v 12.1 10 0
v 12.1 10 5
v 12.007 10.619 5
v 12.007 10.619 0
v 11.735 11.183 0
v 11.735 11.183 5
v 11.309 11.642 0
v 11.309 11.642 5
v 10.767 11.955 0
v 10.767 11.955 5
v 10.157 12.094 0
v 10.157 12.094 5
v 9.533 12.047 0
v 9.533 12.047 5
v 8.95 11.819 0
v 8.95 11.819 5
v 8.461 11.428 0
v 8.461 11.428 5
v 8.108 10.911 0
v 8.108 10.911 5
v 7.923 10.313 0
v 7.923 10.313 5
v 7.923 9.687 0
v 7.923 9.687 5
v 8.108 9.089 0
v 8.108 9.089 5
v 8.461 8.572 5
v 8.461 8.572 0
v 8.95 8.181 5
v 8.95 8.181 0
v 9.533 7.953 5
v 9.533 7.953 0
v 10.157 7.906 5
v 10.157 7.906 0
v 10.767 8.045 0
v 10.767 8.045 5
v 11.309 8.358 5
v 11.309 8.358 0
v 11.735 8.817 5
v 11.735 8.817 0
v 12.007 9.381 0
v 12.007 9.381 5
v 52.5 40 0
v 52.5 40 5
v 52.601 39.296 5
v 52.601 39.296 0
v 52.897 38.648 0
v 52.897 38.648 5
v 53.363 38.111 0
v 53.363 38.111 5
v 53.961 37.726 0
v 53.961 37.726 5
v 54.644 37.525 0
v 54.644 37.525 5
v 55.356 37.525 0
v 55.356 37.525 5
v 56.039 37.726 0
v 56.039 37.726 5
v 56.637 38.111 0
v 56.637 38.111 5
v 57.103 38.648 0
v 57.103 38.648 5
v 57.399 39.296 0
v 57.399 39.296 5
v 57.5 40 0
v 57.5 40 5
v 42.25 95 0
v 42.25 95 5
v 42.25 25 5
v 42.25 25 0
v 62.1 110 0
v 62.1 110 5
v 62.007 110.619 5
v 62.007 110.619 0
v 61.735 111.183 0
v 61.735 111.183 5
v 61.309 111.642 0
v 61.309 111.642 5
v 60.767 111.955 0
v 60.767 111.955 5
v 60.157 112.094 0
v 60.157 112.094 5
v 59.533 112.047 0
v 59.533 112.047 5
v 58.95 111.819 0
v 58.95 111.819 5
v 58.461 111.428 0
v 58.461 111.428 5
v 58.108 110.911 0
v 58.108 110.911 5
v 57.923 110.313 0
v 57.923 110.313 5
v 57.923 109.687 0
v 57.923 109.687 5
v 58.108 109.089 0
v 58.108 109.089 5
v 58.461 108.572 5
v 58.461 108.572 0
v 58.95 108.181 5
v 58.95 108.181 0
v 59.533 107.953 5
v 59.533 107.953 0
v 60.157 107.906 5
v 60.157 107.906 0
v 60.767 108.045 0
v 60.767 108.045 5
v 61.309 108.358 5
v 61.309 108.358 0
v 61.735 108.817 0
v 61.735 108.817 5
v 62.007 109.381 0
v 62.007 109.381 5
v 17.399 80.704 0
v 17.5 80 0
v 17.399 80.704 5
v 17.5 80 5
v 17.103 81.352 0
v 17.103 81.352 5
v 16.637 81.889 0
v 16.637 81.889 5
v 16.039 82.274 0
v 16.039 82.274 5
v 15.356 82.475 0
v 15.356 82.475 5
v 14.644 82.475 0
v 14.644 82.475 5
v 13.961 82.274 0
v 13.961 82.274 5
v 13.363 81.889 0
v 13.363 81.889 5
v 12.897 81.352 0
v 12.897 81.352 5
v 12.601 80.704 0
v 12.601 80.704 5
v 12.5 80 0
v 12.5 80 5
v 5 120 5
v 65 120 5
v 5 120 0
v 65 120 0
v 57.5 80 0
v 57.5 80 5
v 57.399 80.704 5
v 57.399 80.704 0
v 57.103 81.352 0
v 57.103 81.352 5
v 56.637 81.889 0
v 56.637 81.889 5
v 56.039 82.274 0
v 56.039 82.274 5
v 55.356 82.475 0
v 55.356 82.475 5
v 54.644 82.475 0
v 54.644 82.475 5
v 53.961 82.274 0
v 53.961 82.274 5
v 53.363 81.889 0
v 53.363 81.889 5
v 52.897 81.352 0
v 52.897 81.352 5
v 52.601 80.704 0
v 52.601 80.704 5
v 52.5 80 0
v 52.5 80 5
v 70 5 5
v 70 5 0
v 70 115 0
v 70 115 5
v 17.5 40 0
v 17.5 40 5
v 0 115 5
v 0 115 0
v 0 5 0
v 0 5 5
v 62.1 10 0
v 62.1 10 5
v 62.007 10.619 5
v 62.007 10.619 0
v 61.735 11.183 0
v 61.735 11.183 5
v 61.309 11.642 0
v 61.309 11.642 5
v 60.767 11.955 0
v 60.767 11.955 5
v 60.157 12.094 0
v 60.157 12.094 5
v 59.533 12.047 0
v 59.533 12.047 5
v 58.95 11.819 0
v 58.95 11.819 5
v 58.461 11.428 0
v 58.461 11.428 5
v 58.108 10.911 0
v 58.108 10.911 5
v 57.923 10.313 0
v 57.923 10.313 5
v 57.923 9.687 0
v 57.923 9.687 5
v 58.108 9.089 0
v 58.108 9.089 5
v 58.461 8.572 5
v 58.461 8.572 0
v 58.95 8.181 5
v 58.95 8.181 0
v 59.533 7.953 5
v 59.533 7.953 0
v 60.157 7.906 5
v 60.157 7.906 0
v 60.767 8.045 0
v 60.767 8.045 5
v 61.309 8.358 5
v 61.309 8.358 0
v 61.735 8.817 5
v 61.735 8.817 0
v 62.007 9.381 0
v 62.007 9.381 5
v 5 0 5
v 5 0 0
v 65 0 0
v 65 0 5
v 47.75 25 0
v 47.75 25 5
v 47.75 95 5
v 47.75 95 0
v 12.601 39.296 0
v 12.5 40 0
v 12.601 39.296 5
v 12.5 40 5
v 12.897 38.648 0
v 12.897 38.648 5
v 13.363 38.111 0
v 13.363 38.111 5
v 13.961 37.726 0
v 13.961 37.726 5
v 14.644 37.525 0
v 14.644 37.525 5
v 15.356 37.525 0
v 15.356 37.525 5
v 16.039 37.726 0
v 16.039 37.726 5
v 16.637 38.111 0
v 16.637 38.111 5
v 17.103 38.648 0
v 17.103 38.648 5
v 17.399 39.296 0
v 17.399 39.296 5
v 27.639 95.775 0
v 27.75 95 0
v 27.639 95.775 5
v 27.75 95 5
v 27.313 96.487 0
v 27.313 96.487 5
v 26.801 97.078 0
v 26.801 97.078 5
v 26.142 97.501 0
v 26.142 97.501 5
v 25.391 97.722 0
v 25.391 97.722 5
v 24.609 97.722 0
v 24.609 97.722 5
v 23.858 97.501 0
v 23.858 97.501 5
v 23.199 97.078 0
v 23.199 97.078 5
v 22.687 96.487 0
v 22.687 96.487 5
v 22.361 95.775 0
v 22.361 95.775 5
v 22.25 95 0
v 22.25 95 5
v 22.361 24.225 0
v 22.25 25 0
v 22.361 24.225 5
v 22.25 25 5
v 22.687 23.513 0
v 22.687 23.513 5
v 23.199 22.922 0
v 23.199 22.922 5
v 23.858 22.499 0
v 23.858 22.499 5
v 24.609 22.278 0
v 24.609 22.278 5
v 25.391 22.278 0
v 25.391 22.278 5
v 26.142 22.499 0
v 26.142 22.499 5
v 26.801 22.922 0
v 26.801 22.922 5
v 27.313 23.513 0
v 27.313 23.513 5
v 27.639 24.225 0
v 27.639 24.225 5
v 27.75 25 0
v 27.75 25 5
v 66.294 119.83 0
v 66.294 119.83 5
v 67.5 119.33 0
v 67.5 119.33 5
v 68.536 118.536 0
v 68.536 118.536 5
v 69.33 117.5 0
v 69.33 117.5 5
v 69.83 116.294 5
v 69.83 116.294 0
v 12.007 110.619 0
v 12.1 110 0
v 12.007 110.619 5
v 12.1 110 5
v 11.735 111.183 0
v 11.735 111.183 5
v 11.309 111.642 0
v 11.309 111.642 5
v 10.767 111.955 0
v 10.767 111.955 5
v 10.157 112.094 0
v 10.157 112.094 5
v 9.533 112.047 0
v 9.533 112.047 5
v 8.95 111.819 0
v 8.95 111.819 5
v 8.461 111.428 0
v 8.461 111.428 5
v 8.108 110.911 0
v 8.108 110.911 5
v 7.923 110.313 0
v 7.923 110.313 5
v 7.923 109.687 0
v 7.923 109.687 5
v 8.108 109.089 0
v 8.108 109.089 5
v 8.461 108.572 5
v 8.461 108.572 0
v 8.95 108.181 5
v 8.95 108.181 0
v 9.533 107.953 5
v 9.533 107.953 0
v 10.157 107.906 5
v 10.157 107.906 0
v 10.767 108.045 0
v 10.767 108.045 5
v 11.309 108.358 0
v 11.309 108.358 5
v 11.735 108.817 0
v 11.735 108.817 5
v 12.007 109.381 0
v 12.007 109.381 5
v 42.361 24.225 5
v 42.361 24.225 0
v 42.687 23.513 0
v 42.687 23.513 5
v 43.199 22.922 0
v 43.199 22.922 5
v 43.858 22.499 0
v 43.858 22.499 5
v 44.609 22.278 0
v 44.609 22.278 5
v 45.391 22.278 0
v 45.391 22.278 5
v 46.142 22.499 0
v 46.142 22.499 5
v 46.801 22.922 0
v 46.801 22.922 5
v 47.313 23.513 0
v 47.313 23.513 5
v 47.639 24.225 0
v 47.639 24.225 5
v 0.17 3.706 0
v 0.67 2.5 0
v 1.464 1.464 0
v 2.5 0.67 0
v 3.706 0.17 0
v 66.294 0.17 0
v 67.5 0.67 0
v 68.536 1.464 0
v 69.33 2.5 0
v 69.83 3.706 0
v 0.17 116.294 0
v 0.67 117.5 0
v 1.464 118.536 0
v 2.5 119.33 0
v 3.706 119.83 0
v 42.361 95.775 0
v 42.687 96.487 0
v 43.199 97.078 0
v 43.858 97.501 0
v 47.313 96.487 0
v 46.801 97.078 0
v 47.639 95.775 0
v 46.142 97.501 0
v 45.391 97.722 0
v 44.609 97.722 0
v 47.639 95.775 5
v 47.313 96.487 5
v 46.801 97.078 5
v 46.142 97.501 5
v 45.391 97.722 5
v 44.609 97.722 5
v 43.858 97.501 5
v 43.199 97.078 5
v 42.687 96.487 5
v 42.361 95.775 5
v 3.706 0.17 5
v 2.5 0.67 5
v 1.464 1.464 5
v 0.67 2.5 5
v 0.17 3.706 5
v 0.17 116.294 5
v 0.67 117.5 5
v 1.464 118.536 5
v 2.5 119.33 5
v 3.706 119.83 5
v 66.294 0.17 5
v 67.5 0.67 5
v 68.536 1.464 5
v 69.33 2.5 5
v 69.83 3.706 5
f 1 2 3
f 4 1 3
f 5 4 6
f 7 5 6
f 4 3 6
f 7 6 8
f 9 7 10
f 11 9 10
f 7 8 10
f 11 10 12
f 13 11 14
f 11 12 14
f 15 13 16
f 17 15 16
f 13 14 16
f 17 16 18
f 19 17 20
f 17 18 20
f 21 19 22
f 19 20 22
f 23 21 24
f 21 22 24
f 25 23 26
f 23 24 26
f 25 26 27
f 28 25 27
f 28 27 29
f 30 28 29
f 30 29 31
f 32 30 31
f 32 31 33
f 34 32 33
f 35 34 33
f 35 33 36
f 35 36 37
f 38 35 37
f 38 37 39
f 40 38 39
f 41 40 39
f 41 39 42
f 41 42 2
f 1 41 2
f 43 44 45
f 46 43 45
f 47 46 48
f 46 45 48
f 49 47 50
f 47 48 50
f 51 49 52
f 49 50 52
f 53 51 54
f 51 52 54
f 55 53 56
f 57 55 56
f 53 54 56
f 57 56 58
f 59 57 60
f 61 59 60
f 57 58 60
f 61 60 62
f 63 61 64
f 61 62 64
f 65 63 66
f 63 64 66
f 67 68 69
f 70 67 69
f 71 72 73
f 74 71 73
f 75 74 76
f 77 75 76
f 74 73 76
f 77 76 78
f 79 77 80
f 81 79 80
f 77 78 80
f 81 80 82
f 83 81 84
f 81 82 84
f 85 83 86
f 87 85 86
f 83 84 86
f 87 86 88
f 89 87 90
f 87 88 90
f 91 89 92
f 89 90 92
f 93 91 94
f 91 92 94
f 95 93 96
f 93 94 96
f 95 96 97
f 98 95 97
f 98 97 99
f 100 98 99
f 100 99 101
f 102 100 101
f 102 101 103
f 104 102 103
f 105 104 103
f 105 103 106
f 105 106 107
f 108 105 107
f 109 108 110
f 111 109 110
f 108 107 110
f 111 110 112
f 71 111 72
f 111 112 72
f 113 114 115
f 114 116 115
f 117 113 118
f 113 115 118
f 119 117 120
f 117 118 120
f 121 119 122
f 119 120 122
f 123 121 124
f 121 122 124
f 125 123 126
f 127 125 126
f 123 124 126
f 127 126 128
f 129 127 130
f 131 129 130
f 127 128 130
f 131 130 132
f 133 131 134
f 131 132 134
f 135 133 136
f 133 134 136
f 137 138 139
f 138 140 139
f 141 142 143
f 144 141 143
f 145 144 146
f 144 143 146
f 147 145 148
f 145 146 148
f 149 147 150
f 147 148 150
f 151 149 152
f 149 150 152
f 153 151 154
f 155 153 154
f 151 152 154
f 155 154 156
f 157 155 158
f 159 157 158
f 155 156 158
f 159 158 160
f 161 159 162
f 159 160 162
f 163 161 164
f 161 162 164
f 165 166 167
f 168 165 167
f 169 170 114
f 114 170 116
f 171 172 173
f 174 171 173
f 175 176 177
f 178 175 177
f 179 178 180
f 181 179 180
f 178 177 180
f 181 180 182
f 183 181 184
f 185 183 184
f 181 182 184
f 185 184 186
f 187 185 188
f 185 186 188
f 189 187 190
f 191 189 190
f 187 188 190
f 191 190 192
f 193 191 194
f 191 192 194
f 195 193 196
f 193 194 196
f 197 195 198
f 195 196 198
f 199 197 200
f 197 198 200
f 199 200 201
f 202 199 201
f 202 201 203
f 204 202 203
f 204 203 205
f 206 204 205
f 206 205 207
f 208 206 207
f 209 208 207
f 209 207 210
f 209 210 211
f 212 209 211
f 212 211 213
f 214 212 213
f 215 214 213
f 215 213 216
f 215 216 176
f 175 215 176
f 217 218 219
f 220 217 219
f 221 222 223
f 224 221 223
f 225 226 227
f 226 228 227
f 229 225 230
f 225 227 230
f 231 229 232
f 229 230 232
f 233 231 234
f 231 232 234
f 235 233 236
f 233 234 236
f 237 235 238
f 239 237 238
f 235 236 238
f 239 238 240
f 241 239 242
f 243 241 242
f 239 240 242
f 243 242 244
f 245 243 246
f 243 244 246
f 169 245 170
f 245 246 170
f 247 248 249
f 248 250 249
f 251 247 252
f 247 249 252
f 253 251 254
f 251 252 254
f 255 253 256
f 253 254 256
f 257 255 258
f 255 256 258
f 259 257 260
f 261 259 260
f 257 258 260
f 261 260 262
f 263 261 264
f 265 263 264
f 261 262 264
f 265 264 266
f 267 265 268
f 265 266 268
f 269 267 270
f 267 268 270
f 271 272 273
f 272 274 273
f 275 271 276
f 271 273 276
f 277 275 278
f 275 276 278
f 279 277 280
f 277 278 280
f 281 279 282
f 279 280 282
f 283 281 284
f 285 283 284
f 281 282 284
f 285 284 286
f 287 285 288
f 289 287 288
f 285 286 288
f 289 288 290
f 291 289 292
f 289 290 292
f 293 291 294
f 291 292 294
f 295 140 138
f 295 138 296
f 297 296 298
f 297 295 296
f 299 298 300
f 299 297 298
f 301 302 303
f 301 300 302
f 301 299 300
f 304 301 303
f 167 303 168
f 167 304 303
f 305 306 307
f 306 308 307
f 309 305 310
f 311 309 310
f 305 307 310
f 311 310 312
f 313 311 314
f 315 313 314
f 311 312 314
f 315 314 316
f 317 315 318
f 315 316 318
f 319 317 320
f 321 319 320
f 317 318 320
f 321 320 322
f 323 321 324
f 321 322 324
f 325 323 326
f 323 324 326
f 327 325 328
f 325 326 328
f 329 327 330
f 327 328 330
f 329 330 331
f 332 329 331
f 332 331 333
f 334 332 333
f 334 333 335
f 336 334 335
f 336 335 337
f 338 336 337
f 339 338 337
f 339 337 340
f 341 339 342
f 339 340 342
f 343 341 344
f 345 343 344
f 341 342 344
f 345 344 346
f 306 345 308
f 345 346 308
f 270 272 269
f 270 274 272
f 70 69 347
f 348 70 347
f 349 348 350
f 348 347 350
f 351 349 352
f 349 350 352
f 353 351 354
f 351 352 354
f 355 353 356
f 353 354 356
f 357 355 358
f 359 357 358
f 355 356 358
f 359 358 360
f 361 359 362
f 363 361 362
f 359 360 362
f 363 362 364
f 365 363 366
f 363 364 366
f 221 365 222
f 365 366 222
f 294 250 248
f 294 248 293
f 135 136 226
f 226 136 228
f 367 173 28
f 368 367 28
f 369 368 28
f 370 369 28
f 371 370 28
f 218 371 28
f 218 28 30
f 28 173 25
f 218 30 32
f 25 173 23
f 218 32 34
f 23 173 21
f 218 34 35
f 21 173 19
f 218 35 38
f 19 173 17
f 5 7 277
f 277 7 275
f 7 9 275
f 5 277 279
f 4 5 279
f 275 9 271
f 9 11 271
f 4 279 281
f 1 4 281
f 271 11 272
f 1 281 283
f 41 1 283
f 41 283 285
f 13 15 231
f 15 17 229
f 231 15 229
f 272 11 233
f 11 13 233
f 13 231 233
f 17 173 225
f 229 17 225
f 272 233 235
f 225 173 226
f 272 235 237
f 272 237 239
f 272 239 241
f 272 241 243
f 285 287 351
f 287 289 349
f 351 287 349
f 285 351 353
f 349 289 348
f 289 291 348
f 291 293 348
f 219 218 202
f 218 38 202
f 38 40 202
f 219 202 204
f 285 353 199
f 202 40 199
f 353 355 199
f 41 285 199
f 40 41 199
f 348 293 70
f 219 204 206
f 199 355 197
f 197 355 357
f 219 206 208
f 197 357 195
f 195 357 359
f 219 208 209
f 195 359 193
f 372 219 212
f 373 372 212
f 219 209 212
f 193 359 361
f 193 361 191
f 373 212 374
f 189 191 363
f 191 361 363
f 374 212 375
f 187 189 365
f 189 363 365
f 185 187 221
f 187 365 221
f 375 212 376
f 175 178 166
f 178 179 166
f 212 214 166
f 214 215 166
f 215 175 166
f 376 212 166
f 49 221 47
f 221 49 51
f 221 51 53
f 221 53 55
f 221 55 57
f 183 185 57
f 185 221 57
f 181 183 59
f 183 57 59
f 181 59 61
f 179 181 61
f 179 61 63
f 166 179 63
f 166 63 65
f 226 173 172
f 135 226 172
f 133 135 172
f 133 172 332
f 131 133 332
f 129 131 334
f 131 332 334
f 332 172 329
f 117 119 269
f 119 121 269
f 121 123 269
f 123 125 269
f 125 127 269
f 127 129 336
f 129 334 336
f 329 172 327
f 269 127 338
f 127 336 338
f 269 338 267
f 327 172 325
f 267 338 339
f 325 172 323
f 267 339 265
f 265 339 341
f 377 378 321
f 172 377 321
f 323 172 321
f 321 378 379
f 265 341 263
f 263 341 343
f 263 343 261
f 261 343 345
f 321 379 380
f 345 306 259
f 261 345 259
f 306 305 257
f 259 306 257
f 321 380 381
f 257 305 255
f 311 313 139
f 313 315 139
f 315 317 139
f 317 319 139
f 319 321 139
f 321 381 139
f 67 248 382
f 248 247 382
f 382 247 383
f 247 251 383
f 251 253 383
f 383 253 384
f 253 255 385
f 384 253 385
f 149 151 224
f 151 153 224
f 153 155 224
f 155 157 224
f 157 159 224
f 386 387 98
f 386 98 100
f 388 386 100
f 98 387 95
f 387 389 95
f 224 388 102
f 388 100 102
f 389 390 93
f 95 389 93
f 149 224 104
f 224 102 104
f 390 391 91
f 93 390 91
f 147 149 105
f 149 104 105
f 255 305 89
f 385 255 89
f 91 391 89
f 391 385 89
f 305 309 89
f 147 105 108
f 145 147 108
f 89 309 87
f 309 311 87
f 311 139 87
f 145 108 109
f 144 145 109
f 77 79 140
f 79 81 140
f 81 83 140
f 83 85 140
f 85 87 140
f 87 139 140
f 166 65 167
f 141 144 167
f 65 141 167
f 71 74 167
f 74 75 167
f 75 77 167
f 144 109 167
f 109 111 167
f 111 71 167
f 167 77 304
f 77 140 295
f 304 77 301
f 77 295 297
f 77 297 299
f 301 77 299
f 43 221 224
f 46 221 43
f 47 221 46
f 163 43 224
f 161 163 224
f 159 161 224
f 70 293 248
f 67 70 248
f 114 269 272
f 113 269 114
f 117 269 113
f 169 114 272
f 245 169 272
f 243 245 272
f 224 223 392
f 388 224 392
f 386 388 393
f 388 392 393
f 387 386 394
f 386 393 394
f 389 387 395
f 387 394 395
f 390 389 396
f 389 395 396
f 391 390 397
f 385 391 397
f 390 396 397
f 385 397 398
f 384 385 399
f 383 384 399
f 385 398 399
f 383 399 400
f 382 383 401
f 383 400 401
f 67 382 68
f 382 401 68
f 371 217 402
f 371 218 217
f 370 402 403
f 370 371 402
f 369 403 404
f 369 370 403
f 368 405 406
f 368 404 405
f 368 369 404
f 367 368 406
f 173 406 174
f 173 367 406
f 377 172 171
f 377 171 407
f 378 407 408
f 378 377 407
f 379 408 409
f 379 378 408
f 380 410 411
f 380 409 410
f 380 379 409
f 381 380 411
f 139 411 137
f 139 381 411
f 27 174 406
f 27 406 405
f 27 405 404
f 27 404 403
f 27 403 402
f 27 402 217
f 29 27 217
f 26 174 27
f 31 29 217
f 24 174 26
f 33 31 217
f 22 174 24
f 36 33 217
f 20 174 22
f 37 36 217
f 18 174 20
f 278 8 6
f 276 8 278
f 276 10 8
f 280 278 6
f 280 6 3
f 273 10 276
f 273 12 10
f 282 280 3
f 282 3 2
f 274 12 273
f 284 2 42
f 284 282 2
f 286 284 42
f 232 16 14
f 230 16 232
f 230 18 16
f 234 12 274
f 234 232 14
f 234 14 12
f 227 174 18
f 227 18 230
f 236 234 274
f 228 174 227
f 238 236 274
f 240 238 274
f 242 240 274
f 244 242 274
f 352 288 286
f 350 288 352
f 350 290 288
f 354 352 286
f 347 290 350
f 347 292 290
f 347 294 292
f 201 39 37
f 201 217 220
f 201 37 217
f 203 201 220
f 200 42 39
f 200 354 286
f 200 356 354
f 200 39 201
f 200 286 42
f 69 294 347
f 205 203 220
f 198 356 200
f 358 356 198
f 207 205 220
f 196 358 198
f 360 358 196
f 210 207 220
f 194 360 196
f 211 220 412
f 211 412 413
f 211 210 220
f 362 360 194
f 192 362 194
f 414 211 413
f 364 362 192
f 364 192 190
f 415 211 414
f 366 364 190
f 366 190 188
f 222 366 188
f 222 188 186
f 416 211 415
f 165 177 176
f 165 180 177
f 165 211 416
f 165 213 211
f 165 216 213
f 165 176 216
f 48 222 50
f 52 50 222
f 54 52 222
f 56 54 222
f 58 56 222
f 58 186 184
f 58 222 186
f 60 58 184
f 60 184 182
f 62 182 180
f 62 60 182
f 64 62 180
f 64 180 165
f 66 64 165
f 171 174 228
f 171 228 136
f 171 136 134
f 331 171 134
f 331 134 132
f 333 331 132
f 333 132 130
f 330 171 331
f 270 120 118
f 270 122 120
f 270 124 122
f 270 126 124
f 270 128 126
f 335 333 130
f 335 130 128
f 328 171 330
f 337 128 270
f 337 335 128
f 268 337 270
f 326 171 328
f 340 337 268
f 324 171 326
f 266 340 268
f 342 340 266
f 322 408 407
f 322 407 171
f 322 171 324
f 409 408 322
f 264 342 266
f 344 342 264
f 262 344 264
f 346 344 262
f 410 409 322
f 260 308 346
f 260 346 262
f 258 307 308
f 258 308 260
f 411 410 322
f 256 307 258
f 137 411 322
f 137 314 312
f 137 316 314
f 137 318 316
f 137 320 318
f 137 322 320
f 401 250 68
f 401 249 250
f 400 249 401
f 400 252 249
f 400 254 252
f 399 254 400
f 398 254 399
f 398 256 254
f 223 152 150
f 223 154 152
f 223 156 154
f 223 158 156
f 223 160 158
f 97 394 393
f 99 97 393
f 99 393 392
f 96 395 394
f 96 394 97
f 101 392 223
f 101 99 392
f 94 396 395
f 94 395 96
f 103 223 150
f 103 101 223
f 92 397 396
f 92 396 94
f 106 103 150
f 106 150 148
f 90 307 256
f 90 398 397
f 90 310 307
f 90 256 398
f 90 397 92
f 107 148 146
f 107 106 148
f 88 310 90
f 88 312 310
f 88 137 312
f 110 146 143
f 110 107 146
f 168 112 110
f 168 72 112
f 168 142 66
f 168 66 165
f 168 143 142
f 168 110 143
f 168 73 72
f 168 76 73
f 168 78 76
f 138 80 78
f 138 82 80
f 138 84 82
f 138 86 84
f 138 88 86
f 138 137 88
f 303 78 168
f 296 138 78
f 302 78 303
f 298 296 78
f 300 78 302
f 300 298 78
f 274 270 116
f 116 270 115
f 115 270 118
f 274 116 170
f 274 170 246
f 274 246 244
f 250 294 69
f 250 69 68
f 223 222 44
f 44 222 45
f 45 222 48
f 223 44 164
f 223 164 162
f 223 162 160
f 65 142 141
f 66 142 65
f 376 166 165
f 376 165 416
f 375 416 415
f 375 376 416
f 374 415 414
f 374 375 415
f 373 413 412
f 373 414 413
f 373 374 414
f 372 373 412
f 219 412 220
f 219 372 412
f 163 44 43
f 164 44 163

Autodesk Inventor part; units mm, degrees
ref_plane "YZ Plane" through (0, 0, 0) normal (1, 0, 0) x (0, 1, 0)
ref_plane "XZ Plane" through (0, 0, 0) normal (0, 1, 0) x (-1, 0, 0)
ref_plane "XY Plane" through (0, 0, 0) normal (0, 0, 1) x (1, 0, 0)
sketch "Skizze1" plane through (0, 0, 0) normal (0, 0, 1) x (1, 0, 0)
  line L0 (5, 0) -> (65, 0)
  line L1 (70, 5) -> (70, 115)
  line L2 (65, 120) -> (5, 120)
  line L3 (0, 115) -> (0, 5)
  arc A0 (70, 115) -> (65, 120) centre (65, 115) ccw
  arc A1 (65, 0) -> (70, 5) centre (65, 5) ccw
  arc A2 (0, 5) -> (5, 0) centre (5, 5) ccw
  arc A3 (5, 120) -> (0, 115) centre (5, 115) ccw
  point P0 (0, 0)
  point P1 (70, 120)
  point P2 (70, 0)
  dimension "d0" = 120
  dimension "d1" = 70
  dimension "d3" = 5
extrude "Extrusion1" add sketch "Skizze1" along normal blind 5
sketch "Skizze2" plane through (0, 0, 5) normal (0, 0, 1) x (1, 0, 0)
  circle A0 centre (60, 10) radius 2.1
  circle A1 centre (10, 10) radius 2.1
  circle A2 centre (10, 110) radius 2.1
  circle A3 centre (60, 110) radius 2.1
  point P0 (0, 0)
  dimension "d6" = 4.2
  dimension "d7" = 4.2
  dimension "d8" = 4.2
  dimension "d9" = 4.2
  dimension "d10" = 100
  dimension "d11" = 50
  dimension "d12" = 10
  dimension "d13" = 10
extrude "Extrusion2" cut sketch "Skizze2" against normal through all
sketch "Skizze3" plane through (0, 0, 5) normal (0, 0, 1) x (1, 0, 0)
  line L0 (15, 80) -> (15, 40) construction
  line L1 (12.5, 80) -> (12.5, 40)
  line L2 (17.5, 40) -> (17.5, 80)
  arc A0 (17.5, 80) -> (12.5, 80) centre (15, 80) ccw
  arc A1 (12.5, 40) -> (17.5, 40) centre (15, 40) ccw
  line L3 (65, 120) -> (5, 120) projected
  line L4 (35, 120) -> (35, 0) construction
  line L5 (0, 115) -> (0, 5) projected
  line L6 (0, 60) -> (70, 60) construction
  line L7 (70, 5) -> (70, 115) projected
  line L8 (55, 80) -> (55, 40) construction
  line L9 (57.5, 80) -> (57.5, 40)
  line L10 (52.5, 40) -> (52.5, 80)
  arc A2 (57.5, 80) -> (52.5, 80) centre (55, 80) ccw
  arc A3 (52.5, 40) -> (57.5, 40) centre (55, 40) ccw
  point P0 (0, 0)
  point P1 (15, 60)
  point P2 (55, 60)
  dimension "d16" = 40
  dimension "d18" = 2.5
  dimension "d20" = 20
  dimension "d21" = 0
extrude "Extrusion3" cut sketch "Skizze3" against normal through all
sketch "Skizze4" plane through (0, 0, 5) normal (0, 0, 1) x (1, 0, 0)
  line L0 (45, 25) -> (45, 95) construction
  line L1 (47.75, 25) -> (47.75, 95)
  line L2 (42.25, 95) -> (42.25, 25)
  arc A0 (42.25, 25) -> (47.75, 25) centre (45, 25) ccw
  arc A1 (47.75, 95) -> (42.25, 95) centre (45, 95) ccw
  line L3 (5, 0) -> (65, 0) projected
  line L4 (35, 0) -> (35, 120) construction
  line L5 (65, 120) -> (5, 120) projected
  line L6 (70, 5) -> (70, 115) projected
  line L7 (70, 60) -> (0, 60) construction
  line L8 (0, 115) -> (0, 5) projected
  line L9 (25, 25) -> (25, 95) construction
  line L10 (22.25, 25) -> (22.25, 95)
  line L11 (27.75, 95) -> (27.75, 25)
  arc A2 (22.25, 25) -> (27.75, 25) centre (25, 25) ccw
  arc A3 (27.75, 95) -> (22.25, 95) centre (25, 95) ccw
  arc A4 (17.5, 80) -> (12.5, 80) centre (15, 80) ccw projected
  arc A5 (12.5, 40) -> (17.5, 40) centre (15, 40) ccw projected
  point P0 (0, 0)
  point P1 (45, 60)
  point P2 (25, 60)
  point P3 (25, 60)
  point P4 (35, 60)
  dimension "d24" = 2.75
  dimension "d28" = 10
  dimension "d35" = 15
extrude "Extrusion4" cut sketch "Skizze4" against normal up to surface (5 mm away)
properties part number "103.009.01_Grundplatte_Stopper" material "PMMA-Kunststoff"
